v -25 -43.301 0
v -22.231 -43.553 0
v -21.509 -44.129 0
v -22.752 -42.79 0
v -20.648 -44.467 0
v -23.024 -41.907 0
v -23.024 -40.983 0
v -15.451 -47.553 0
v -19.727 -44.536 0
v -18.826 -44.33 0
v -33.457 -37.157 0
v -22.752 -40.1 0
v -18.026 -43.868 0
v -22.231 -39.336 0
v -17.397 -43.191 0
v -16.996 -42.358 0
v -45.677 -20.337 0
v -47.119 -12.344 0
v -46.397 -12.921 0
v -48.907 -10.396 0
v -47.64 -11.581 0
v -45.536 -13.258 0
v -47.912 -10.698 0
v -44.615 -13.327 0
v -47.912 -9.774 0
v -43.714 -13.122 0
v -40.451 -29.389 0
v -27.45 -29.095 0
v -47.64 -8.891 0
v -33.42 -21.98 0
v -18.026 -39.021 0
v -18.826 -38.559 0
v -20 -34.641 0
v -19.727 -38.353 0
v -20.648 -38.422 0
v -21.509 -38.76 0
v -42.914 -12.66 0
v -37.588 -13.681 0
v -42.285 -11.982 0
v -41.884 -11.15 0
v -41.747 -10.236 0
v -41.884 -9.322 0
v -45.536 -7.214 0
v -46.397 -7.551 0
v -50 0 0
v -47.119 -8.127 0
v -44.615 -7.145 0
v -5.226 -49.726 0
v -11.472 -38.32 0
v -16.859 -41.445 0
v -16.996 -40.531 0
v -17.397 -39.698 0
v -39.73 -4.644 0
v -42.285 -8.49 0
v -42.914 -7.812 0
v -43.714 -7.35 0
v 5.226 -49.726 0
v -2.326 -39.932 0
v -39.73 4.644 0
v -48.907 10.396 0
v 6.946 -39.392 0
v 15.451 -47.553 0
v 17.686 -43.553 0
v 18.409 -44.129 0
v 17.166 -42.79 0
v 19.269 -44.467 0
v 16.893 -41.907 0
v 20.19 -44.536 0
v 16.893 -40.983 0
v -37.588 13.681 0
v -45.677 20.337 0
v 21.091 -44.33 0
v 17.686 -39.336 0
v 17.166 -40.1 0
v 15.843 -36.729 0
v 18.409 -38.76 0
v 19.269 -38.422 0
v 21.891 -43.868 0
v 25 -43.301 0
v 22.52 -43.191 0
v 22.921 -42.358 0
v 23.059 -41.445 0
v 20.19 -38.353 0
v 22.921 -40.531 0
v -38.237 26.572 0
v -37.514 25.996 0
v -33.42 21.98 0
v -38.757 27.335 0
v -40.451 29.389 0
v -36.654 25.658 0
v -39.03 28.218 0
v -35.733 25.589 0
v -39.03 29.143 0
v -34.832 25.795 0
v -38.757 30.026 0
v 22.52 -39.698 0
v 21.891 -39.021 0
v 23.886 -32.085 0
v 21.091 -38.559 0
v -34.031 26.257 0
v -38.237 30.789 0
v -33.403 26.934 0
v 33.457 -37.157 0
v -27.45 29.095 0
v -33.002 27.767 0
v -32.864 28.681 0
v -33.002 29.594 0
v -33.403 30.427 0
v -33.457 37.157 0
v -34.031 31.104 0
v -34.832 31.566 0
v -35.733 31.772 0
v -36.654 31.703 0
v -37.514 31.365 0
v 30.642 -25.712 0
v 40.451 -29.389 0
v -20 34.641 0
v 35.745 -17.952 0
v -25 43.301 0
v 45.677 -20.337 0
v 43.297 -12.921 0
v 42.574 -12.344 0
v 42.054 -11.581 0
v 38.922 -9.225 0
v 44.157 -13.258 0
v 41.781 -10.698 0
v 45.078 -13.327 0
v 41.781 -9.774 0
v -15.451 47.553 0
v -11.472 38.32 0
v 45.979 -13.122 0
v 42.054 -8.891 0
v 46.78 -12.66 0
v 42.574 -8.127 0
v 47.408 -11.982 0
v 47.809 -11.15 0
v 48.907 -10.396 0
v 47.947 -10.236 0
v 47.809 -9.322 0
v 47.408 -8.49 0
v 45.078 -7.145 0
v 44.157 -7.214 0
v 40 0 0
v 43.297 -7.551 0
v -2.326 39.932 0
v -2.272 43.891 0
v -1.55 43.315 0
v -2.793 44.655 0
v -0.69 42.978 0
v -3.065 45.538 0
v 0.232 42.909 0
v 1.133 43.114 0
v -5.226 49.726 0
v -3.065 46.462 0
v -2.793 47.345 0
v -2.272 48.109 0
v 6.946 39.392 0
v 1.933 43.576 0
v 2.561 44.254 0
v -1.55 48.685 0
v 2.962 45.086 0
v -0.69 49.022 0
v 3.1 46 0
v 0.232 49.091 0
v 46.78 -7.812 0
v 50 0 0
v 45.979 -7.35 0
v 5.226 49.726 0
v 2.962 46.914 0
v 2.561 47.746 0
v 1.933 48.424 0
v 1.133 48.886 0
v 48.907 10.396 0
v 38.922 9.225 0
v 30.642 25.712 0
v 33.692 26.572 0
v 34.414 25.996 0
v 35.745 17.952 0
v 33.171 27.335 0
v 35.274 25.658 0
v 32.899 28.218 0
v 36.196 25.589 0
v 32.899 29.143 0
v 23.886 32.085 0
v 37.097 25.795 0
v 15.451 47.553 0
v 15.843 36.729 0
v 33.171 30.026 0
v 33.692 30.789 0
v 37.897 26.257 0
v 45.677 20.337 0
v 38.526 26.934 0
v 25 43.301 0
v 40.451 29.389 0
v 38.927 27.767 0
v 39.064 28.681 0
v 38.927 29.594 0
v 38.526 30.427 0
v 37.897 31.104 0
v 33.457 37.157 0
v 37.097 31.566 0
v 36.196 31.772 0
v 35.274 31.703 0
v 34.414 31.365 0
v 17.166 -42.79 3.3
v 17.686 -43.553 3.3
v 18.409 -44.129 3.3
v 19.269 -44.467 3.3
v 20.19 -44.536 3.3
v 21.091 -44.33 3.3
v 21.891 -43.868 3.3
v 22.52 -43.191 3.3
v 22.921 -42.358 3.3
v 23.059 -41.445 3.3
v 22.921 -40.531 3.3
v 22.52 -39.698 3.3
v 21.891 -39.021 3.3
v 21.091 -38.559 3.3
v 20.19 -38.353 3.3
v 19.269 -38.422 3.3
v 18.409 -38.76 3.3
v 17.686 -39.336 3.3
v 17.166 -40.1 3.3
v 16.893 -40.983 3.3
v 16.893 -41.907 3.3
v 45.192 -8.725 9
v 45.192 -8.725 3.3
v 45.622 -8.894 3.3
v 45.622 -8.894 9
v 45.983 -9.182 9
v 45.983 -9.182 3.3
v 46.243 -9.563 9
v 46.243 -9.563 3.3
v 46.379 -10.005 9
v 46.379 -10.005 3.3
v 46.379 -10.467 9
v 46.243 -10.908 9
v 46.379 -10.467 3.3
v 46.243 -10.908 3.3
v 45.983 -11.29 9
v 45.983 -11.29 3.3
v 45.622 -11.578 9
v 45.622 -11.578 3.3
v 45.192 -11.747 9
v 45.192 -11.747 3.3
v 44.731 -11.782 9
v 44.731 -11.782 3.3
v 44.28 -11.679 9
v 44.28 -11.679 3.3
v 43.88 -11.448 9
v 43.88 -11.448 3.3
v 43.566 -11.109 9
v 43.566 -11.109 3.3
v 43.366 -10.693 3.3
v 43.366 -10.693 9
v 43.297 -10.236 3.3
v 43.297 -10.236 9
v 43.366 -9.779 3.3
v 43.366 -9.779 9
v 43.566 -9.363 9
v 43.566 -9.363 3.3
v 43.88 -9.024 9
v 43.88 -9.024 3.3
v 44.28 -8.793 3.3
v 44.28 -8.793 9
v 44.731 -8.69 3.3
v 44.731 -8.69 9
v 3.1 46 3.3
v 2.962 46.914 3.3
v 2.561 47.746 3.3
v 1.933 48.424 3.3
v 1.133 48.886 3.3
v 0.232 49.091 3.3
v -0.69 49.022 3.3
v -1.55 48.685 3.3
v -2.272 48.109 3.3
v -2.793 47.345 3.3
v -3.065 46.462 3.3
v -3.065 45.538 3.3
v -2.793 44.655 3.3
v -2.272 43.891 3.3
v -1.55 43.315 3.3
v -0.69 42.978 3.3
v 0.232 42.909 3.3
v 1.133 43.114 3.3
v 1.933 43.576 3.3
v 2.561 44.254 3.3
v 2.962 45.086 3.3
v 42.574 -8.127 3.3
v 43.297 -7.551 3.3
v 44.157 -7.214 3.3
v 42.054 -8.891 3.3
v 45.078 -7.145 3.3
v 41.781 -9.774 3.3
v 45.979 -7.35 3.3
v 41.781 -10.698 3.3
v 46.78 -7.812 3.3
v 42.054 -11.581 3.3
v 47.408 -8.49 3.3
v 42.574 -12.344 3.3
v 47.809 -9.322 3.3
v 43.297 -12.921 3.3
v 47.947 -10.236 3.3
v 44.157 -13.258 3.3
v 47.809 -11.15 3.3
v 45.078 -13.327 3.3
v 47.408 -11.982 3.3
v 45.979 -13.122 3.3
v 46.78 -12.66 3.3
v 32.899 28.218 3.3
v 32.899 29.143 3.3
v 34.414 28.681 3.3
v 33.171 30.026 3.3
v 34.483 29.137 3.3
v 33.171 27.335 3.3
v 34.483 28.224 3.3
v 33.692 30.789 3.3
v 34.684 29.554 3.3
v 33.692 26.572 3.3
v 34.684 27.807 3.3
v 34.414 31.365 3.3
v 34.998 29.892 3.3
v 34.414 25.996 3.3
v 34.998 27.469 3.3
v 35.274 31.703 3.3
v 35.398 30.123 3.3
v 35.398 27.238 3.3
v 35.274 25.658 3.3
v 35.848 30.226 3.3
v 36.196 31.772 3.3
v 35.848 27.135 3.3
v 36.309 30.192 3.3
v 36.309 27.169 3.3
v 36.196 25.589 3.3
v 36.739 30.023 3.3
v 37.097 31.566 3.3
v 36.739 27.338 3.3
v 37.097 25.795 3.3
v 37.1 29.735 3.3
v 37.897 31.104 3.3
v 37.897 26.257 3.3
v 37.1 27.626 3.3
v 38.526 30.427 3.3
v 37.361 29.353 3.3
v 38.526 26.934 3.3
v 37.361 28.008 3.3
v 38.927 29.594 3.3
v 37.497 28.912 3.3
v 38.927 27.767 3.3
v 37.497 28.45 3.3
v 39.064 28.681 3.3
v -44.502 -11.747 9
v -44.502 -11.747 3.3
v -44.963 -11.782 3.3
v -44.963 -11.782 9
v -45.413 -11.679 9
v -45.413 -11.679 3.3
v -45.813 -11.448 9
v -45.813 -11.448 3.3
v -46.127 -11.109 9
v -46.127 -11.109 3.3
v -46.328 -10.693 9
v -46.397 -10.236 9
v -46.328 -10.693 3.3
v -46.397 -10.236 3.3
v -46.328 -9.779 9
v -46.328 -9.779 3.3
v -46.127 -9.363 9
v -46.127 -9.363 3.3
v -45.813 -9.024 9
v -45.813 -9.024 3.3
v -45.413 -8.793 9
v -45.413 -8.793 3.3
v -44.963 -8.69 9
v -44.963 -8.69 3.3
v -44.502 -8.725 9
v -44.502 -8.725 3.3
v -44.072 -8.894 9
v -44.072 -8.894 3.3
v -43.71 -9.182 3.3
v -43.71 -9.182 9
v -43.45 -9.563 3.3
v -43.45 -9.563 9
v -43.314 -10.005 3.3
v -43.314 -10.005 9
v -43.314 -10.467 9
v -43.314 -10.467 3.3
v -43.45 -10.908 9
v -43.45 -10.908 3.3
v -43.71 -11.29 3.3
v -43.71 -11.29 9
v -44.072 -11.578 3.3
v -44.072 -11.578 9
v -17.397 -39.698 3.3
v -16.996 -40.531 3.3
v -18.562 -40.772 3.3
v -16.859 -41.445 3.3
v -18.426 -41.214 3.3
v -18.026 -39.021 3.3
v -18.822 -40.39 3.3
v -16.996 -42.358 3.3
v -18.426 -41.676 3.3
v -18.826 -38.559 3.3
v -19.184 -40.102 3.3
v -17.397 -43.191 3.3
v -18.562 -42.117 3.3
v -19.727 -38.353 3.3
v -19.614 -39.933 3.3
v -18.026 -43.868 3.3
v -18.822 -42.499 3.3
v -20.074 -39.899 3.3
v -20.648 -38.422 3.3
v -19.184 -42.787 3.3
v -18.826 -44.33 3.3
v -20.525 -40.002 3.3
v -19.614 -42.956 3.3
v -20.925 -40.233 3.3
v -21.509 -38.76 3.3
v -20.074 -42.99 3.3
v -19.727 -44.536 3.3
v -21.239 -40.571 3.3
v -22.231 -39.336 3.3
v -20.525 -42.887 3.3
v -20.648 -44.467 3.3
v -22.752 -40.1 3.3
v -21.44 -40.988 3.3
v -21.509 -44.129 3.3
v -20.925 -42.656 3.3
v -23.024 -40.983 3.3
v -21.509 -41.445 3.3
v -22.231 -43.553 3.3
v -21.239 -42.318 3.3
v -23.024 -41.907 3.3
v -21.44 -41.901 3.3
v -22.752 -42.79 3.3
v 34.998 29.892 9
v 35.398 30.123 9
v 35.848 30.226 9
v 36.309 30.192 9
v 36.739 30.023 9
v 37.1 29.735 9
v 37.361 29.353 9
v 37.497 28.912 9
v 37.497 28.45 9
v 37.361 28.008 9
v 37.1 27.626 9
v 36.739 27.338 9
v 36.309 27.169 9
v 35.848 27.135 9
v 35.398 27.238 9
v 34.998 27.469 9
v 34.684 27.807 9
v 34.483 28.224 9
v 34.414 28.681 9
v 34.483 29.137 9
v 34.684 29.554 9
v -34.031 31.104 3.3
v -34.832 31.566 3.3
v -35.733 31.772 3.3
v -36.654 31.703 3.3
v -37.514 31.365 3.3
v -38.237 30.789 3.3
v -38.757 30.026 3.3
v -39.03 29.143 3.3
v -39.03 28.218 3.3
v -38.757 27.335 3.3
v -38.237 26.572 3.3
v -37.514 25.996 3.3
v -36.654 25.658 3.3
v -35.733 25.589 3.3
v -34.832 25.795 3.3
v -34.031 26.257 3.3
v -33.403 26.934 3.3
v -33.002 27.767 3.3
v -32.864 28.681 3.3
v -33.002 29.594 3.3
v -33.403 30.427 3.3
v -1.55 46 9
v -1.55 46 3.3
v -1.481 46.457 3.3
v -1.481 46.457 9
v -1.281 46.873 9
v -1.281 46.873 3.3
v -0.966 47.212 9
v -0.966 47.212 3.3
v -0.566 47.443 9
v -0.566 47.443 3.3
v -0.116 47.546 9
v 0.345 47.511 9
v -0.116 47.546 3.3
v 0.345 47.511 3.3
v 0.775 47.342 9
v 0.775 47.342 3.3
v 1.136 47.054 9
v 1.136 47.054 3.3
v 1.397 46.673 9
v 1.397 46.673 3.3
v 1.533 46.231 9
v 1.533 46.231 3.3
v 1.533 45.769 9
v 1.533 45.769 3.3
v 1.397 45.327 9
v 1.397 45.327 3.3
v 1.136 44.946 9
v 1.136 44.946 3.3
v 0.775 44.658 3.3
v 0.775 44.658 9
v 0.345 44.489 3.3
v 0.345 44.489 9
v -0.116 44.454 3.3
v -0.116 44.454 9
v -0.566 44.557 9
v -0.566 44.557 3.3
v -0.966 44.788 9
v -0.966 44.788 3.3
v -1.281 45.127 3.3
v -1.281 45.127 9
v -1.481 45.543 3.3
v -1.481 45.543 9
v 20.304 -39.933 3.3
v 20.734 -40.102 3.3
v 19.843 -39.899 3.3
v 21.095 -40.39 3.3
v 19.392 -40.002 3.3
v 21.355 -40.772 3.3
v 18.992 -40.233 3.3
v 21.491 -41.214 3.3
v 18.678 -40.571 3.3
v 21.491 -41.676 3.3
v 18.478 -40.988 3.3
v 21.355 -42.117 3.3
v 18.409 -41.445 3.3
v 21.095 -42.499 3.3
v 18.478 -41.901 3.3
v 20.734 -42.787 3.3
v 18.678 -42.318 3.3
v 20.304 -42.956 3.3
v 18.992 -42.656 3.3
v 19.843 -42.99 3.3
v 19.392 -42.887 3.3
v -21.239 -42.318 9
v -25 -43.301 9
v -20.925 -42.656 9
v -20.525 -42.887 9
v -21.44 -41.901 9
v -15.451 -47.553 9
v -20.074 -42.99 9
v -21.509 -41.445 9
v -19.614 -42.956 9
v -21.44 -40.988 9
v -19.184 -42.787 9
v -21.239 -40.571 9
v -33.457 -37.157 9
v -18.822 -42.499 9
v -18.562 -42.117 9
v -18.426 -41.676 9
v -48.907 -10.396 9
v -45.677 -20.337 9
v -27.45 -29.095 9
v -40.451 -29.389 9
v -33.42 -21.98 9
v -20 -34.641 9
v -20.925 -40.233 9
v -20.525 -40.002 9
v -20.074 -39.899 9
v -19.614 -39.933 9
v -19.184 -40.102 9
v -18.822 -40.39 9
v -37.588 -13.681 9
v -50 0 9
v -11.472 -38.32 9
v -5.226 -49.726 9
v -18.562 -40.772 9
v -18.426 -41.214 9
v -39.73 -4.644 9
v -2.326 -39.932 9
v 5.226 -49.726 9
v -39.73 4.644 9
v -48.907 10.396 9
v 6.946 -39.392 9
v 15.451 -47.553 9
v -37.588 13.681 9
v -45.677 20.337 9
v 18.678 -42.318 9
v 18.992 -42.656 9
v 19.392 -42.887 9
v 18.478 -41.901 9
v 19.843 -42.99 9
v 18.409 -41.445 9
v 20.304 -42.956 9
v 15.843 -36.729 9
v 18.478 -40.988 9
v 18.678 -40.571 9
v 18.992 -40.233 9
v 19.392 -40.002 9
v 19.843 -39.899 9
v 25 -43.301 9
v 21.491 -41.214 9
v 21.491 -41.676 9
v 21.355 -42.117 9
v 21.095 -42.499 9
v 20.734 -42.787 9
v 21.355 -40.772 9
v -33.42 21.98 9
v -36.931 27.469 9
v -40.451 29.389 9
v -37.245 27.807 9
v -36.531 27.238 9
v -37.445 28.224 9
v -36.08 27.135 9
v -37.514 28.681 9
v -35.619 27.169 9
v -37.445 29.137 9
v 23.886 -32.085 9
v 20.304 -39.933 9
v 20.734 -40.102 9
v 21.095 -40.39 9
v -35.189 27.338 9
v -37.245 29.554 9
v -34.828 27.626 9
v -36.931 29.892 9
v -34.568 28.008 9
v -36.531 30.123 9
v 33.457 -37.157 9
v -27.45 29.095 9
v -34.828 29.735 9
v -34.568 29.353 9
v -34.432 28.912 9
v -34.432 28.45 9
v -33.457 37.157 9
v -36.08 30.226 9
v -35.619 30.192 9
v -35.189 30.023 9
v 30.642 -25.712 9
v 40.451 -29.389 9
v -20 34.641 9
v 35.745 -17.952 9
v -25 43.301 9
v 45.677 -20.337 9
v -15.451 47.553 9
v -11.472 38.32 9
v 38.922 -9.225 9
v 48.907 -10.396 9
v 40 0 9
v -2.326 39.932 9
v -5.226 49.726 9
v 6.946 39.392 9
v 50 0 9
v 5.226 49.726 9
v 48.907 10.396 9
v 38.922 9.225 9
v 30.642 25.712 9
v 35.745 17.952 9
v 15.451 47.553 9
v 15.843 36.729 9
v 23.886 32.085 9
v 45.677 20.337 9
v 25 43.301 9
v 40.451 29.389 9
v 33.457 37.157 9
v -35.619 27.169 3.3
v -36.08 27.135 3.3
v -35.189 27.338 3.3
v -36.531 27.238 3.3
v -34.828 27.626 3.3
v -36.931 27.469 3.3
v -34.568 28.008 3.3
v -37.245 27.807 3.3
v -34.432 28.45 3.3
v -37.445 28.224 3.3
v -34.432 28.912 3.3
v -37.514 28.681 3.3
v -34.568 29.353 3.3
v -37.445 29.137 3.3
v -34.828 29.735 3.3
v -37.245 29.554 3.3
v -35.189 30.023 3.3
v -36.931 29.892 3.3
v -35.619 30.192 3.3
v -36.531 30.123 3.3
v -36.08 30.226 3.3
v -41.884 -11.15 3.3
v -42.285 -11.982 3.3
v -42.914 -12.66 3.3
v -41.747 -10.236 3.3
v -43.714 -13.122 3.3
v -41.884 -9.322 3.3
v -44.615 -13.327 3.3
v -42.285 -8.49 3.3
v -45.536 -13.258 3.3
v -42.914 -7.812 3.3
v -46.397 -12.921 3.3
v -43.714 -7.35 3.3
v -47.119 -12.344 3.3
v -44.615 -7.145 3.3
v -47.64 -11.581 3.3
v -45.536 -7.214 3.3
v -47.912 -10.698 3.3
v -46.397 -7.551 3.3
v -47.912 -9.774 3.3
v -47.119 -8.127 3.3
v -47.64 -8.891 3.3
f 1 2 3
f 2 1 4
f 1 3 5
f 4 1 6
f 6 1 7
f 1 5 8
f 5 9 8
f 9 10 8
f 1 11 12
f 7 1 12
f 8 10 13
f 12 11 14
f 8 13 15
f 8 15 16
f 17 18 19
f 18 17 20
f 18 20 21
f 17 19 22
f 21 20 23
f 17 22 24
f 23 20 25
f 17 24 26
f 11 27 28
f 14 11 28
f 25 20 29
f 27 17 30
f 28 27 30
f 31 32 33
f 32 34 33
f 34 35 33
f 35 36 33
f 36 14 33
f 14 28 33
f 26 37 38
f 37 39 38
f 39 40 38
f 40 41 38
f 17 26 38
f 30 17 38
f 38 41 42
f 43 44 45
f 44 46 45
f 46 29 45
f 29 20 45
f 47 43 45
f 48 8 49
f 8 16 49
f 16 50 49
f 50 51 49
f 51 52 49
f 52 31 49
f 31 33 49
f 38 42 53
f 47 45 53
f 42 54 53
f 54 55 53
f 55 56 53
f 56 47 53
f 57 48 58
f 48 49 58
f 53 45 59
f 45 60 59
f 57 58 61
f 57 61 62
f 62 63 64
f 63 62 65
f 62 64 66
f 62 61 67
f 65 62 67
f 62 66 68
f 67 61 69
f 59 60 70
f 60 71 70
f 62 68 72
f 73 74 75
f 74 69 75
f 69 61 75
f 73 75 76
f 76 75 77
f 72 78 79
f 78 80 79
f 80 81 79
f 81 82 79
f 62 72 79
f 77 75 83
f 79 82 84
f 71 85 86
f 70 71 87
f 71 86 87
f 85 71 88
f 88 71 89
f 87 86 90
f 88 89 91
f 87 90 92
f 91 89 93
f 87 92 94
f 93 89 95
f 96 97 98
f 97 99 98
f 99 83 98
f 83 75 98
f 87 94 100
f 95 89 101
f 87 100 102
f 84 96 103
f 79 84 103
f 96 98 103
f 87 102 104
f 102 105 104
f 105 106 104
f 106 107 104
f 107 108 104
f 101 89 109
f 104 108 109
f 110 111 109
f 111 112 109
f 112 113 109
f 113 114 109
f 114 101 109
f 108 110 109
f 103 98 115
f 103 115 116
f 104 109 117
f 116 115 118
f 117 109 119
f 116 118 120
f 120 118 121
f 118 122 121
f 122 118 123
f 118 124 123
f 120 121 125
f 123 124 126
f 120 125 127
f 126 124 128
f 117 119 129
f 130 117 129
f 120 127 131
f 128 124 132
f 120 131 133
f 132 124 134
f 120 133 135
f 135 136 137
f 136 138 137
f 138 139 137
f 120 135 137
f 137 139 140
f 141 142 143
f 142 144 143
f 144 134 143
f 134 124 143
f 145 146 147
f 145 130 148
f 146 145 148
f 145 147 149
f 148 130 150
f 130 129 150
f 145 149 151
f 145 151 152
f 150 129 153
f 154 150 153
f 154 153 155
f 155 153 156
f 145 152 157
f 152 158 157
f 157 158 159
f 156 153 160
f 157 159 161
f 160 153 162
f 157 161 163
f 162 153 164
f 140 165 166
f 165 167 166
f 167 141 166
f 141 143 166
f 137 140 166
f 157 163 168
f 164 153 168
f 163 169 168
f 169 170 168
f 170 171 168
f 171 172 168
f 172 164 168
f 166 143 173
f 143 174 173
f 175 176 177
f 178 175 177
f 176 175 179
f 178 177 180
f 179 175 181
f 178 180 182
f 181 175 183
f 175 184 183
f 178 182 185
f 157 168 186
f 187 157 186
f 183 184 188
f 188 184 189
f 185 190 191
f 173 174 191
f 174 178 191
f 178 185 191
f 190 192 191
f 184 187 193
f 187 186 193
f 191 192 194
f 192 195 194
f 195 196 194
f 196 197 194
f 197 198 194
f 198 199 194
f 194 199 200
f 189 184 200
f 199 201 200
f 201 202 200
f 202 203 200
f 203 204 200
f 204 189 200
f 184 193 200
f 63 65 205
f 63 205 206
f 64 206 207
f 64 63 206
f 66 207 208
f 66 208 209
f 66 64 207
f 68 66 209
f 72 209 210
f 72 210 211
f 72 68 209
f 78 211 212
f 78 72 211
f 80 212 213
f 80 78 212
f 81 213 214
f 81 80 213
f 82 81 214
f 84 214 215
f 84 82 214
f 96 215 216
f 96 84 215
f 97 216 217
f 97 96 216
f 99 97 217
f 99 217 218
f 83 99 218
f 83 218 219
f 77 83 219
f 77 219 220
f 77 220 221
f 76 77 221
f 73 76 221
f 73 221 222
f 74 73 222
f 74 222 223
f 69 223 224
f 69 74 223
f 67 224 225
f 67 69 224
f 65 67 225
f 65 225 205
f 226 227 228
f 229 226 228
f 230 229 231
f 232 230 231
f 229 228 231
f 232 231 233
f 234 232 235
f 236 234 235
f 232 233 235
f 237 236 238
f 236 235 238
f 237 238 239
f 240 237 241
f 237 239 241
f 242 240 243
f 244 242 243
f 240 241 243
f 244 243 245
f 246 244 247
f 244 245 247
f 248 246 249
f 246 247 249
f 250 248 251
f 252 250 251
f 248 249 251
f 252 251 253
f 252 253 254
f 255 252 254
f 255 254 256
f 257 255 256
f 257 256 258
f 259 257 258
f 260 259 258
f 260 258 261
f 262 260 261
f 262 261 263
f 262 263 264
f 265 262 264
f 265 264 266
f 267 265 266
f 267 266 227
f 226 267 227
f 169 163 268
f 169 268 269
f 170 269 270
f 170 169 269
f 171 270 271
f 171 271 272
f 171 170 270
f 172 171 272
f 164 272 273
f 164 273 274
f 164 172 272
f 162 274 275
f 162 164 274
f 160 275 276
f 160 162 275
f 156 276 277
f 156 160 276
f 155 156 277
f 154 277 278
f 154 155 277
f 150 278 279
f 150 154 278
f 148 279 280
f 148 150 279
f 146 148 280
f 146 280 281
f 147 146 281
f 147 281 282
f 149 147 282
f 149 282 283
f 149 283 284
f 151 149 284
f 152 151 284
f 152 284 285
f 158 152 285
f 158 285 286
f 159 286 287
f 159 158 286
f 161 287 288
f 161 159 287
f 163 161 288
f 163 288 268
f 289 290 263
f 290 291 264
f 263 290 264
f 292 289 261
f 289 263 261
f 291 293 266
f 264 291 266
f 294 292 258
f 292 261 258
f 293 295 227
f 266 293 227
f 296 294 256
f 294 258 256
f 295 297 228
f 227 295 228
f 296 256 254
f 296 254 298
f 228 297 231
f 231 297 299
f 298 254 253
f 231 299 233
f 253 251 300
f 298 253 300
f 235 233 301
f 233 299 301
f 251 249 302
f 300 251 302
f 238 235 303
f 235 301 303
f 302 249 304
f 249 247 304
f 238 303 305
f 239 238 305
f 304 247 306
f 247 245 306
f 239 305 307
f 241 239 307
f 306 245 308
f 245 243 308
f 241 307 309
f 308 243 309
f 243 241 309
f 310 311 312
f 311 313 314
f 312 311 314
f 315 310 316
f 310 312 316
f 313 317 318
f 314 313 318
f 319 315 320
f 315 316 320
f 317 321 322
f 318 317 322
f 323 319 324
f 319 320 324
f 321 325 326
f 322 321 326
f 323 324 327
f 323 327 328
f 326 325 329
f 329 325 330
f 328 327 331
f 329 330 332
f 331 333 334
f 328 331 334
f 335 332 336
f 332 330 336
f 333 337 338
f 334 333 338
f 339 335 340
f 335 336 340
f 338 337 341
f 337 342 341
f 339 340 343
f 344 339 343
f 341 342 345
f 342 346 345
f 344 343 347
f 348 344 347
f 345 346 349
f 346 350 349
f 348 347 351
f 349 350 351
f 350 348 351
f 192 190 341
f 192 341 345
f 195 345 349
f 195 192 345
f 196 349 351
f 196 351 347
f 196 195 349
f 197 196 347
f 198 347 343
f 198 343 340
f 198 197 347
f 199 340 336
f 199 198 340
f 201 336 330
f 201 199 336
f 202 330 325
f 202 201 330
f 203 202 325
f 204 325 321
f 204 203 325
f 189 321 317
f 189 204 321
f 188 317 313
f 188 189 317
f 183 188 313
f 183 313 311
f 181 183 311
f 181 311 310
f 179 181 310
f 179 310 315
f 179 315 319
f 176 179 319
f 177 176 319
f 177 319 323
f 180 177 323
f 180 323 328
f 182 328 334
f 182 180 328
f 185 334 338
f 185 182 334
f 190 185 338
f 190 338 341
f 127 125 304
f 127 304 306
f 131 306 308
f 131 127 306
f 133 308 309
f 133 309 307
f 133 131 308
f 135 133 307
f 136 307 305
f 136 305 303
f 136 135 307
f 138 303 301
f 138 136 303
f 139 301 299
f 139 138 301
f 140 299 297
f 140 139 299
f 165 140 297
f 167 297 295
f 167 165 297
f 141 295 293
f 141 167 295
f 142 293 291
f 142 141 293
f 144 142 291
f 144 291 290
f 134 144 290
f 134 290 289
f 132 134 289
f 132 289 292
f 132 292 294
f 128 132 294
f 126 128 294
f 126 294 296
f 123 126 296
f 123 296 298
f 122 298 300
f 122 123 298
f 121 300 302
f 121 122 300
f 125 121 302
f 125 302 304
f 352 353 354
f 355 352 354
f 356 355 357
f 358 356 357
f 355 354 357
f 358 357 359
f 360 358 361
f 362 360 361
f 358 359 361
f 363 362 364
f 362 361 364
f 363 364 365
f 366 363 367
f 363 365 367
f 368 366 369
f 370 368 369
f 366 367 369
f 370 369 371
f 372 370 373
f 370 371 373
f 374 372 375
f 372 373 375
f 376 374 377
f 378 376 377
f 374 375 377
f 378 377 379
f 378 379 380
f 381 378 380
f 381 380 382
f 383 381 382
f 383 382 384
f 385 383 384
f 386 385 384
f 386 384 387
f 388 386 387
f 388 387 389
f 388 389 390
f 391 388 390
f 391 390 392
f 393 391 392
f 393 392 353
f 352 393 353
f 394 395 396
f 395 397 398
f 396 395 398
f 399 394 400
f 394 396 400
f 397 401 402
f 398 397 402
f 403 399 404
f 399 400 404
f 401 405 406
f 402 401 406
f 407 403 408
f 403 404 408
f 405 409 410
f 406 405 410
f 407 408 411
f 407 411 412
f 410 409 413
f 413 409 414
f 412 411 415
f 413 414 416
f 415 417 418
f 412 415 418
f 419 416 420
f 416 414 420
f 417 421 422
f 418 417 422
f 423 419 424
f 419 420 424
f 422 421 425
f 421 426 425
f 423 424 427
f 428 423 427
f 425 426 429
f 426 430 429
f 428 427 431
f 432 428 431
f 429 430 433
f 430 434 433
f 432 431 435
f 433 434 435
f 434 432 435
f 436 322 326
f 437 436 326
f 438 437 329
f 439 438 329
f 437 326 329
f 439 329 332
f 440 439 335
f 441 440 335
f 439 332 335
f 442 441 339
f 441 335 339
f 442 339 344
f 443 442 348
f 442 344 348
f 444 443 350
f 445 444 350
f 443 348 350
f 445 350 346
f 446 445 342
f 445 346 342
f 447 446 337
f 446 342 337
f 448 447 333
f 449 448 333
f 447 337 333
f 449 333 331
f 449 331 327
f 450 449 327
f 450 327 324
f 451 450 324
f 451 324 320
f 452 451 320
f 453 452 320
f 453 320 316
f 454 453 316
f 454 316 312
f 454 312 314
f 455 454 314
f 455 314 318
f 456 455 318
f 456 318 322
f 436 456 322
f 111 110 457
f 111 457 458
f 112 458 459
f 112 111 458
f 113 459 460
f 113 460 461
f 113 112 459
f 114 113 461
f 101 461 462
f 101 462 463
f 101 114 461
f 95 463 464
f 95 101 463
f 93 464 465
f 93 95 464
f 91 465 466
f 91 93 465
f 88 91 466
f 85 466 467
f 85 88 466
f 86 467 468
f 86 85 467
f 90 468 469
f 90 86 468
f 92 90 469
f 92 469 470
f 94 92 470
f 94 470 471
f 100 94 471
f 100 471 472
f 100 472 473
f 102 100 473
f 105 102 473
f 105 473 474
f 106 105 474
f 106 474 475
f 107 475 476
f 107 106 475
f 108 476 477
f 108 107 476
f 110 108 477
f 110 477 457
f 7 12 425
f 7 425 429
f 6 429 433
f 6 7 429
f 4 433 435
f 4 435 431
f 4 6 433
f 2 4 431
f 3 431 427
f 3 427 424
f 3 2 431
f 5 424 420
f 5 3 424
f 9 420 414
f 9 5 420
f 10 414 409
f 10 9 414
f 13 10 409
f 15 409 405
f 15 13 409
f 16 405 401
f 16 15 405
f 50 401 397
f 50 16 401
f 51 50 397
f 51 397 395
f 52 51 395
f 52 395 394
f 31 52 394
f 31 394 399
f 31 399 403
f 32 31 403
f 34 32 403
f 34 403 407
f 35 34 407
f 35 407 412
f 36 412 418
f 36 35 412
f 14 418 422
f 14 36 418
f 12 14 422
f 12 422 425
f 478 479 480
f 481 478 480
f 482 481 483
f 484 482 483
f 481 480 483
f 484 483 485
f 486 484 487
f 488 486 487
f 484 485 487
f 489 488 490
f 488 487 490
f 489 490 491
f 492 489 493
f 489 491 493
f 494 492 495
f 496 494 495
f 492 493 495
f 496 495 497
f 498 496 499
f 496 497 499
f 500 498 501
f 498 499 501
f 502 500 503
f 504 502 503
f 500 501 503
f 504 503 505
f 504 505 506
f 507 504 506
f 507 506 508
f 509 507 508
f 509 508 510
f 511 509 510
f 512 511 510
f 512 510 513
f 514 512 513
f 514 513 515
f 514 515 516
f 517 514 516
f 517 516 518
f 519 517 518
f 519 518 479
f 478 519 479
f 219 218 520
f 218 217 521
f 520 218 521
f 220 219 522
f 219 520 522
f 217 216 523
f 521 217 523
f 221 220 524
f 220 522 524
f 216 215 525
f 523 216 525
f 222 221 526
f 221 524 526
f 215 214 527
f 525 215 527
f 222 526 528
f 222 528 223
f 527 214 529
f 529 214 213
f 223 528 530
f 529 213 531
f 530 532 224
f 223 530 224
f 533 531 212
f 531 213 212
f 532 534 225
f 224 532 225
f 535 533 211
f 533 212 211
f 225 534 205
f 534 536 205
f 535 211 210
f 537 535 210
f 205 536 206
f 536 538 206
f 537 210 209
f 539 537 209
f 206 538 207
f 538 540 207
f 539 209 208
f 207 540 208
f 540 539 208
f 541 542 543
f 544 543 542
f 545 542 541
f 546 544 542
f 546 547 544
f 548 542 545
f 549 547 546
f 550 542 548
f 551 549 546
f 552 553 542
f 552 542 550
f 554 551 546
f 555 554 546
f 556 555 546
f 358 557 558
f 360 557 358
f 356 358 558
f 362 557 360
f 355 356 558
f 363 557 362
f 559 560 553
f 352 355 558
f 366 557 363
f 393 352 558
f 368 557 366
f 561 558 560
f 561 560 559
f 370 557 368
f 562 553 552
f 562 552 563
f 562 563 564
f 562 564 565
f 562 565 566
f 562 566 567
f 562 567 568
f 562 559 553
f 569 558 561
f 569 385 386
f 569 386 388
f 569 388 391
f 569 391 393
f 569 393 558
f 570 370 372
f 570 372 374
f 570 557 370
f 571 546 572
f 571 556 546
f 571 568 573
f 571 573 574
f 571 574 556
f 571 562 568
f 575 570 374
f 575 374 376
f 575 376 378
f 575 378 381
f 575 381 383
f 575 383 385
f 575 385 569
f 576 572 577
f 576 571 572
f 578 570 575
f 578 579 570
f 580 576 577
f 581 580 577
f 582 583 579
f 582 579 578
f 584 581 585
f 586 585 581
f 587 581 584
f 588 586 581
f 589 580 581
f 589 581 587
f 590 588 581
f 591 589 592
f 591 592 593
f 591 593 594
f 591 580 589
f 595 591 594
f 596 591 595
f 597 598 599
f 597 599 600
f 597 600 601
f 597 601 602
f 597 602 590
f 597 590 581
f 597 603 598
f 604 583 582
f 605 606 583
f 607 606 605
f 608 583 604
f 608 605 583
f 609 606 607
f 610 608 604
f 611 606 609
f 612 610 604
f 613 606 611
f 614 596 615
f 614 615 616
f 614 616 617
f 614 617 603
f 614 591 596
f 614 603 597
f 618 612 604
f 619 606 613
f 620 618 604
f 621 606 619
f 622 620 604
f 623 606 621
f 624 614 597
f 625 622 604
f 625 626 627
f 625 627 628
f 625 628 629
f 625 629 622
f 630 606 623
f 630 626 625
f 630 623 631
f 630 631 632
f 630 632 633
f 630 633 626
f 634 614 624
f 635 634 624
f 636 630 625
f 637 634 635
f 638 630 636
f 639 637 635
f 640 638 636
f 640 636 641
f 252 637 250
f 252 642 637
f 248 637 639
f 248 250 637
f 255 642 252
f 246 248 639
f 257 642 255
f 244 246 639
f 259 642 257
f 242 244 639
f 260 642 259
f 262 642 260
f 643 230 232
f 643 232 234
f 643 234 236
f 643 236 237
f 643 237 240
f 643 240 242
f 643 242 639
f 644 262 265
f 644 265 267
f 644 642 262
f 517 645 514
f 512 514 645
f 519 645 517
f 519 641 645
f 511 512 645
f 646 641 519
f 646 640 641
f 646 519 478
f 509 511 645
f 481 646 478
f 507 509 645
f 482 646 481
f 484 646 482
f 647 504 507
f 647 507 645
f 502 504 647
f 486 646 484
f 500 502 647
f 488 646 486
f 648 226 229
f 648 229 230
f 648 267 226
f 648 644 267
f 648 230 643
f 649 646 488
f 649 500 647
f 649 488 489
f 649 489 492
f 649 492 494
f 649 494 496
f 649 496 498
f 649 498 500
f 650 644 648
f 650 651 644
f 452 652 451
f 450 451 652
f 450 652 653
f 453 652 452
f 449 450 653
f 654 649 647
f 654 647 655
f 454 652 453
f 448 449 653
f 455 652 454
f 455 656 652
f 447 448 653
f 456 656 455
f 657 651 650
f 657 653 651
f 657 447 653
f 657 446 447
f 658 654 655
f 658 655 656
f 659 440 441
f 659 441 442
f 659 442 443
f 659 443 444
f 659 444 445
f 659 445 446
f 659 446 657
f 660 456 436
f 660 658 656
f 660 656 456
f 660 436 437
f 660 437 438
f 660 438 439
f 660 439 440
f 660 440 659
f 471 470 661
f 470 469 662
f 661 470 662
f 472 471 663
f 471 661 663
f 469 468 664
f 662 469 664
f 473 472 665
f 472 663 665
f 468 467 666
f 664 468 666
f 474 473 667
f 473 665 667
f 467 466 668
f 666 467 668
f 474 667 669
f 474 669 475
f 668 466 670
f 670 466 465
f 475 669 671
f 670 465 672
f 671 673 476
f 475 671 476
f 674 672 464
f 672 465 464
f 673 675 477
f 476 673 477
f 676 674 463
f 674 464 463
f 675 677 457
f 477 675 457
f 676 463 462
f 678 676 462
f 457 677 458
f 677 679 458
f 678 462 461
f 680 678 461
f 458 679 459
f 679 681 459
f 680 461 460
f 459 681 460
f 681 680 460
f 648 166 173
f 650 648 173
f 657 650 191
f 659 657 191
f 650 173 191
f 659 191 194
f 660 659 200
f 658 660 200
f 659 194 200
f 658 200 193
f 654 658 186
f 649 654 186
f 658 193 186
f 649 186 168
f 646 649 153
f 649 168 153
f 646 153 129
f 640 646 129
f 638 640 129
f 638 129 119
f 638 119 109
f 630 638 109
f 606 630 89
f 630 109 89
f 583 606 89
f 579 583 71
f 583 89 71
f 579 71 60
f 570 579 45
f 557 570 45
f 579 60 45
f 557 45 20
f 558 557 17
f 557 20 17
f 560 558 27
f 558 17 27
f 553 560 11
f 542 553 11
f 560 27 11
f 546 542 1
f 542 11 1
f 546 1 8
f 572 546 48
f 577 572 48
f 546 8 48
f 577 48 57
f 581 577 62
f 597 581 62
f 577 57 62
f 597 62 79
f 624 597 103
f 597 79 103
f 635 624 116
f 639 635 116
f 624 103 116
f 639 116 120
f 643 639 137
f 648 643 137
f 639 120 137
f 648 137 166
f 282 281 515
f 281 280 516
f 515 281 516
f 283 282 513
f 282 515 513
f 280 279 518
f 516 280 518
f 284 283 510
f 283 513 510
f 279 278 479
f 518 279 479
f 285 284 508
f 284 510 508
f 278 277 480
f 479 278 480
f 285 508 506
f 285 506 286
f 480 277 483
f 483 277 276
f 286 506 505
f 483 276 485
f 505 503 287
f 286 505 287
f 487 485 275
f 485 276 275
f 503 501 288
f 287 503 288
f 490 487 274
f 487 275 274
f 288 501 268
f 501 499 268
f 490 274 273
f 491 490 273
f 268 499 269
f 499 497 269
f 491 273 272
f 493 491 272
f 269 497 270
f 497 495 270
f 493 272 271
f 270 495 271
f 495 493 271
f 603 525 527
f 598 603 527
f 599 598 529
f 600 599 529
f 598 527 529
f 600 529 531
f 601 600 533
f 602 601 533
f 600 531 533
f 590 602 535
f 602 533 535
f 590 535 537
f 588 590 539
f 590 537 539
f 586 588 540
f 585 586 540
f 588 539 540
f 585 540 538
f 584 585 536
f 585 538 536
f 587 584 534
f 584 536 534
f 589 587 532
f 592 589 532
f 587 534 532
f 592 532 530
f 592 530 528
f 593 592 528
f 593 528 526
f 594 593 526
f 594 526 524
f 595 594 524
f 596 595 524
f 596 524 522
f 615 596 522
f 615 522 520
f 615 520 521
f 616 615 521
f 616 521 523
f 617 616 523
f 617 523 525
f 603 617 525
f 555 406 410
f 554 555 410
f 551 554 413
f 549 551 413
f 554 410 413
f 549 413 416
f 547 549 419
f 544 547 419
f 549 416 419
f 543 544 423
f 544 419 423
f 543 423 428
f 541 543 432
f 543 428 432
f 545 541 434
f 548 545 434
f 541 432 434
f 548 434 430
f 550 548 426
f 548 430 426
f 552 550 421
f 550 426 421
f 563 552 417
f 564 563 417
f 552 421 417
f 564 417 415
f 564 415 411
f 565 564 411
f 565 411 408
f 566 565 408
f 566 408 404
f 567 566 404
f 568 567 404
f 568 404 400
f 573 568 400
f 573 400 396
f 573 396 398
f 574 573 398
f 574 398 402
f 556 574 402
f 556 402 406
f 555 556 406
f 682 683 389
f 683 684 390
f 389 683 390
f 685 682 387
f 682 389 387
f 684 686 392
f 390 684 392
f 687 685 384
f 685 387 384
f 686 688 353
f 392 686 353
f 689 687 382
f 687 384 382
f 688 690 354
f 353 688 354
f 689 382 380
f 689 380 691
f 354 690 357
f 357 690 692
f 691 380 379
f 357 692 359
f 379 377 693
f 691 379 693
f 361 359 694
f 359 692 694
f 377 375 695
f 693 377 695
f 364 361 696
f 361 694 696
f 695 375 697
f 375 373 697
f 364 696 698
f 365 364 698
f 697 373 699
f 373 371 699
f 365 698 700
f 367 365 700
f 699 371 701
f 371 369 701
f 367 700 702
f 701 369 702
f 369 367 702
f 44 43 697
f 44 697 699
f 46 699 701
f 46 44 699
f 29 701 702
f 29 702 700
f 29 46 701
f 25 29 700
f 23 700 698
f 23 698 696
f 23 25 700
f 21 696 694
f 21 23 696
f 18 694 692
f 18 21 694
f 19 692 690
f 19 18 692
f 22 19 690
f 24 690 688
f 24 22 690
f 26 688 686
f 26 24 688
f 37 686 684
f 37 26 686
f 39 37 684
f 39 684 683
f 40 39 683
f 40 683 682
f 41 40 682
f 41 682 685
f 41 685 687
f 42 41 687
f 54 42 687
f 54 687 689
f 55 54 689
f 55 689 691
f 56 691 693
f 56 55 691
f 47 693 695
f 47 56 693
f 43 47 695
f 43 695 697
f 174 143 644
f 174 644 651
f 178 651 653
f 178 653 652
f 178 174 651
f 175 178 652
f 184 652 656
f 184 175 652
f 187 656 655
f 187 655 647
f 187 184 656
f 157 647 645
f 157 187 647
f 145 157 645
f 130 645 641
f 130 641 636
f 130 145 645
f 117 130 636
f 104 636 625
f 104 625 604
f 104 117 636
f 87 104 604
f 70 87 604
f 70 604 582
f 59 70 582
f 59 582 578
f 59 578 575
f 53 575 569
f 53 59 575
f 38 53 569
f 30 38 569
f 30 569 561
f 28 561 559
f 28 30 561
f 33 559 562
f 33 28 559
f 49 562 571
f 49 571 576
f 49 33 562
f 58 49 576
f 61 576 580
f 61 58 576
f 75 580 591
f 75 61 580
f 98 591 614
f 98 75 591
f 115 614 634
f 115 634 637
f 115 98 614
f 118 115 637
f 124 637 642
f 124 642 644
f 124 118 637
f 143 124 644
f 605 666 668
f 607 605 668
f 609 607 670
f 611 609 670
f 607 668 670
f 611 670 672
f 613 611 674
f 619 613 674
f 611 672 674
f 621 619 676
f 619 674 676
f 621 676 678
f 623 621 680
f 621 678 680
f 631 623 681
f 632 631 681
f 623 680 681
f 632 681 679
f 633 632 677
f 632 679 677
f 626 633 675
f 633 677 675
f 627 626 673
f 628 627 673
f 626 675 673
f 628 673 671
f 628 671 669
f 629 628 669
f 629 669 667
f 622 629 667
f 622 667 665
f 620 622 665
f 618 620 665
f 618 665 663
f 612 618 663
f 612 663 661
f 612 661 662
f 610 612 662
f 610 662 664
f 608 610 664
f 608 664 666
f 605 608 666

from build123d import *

# Parameters (mm, degrees)
SKIZZE1_R                        = 50
SKIZZE1_R_2                      = 40
AUFSATZ_LINEAR_AUSTRAGEN1_DEPTH  = 9
F_3_1_3_1_DURCHMESSER_BOHRUNG1_D = 3.1
KREISMUSTER1_COUNT               = 7
SKIZZE4_R                        = 3.1
SCHNITT_LINEAR_AUSTRAGEN1_DEPTH  = 3.3
KREISMUSTER2_COUNT               = 7


with BuildPart() as part:
    # Skizze1 → Aufsatz-Linear austragen1 (new body)
    with BuildSketch(Plane.XY):
        Circle(SKIZZE1_R)
        Circle(SKIZZE1_R_2, mode=Mode.SUBTRACT)
    extrude(amount=AUFSATZ_LINEAR_AUSTRAGEN1_DEPTH)

    # Ø3.1 (3.1) Durchmesser Bohrung1 (through all)
    with Locations(Plane.XY.offset(9)):
        with Locations((0, 46)):
            f_3_1_3_1_durchmesser_bohrung1 = Hole(F_3_1_3_1_DURCHMESSER_BOHRUNG1_D / 2)

    # Kreismuster1: Ø3.1 (3.1) Durchmesser Bohrung1 ×7 about axis
    kreismuster1_axis = Axis((0, 0, 0), (0, 0, 1))
    for i in range(1, KREISMUSTER1_COUNT):
        add(f_3_1_3_1_durchmesser_bohrung1.rotate(kreismuster1_axis, i * 360 / KREISMUSTER1_COUNT), mode=Mode.SUBTRACT)

    # Skizze4 → Schnitt-Linear austragen1 (cut)
    with BuildSketch(Plane.XY):
        with Locations((0, 46)):
            Circle(SKIZZE4_R)
    schnitt_linear_austragen1 = extrude(amount=SCHNITT_LINEAR_AUSTRAGEN1_DEPTH, mode=Mode.SUBTRACT)

    # Kreismuster2: Schnitt-Linear austragen1 ×7 about axis
    kreismuster2_axis = Axis((0, 0, 0), (0, 0, 1))
    for i in range(1, KREISMUSTER2_COUNT):
        add(schnitt_linear_austragen1.rotate(kreismuster2_axis, i * 360 / KREISMUSTER2_COUNT), mode=Mode.SUBTRACT)


solid = part.part
